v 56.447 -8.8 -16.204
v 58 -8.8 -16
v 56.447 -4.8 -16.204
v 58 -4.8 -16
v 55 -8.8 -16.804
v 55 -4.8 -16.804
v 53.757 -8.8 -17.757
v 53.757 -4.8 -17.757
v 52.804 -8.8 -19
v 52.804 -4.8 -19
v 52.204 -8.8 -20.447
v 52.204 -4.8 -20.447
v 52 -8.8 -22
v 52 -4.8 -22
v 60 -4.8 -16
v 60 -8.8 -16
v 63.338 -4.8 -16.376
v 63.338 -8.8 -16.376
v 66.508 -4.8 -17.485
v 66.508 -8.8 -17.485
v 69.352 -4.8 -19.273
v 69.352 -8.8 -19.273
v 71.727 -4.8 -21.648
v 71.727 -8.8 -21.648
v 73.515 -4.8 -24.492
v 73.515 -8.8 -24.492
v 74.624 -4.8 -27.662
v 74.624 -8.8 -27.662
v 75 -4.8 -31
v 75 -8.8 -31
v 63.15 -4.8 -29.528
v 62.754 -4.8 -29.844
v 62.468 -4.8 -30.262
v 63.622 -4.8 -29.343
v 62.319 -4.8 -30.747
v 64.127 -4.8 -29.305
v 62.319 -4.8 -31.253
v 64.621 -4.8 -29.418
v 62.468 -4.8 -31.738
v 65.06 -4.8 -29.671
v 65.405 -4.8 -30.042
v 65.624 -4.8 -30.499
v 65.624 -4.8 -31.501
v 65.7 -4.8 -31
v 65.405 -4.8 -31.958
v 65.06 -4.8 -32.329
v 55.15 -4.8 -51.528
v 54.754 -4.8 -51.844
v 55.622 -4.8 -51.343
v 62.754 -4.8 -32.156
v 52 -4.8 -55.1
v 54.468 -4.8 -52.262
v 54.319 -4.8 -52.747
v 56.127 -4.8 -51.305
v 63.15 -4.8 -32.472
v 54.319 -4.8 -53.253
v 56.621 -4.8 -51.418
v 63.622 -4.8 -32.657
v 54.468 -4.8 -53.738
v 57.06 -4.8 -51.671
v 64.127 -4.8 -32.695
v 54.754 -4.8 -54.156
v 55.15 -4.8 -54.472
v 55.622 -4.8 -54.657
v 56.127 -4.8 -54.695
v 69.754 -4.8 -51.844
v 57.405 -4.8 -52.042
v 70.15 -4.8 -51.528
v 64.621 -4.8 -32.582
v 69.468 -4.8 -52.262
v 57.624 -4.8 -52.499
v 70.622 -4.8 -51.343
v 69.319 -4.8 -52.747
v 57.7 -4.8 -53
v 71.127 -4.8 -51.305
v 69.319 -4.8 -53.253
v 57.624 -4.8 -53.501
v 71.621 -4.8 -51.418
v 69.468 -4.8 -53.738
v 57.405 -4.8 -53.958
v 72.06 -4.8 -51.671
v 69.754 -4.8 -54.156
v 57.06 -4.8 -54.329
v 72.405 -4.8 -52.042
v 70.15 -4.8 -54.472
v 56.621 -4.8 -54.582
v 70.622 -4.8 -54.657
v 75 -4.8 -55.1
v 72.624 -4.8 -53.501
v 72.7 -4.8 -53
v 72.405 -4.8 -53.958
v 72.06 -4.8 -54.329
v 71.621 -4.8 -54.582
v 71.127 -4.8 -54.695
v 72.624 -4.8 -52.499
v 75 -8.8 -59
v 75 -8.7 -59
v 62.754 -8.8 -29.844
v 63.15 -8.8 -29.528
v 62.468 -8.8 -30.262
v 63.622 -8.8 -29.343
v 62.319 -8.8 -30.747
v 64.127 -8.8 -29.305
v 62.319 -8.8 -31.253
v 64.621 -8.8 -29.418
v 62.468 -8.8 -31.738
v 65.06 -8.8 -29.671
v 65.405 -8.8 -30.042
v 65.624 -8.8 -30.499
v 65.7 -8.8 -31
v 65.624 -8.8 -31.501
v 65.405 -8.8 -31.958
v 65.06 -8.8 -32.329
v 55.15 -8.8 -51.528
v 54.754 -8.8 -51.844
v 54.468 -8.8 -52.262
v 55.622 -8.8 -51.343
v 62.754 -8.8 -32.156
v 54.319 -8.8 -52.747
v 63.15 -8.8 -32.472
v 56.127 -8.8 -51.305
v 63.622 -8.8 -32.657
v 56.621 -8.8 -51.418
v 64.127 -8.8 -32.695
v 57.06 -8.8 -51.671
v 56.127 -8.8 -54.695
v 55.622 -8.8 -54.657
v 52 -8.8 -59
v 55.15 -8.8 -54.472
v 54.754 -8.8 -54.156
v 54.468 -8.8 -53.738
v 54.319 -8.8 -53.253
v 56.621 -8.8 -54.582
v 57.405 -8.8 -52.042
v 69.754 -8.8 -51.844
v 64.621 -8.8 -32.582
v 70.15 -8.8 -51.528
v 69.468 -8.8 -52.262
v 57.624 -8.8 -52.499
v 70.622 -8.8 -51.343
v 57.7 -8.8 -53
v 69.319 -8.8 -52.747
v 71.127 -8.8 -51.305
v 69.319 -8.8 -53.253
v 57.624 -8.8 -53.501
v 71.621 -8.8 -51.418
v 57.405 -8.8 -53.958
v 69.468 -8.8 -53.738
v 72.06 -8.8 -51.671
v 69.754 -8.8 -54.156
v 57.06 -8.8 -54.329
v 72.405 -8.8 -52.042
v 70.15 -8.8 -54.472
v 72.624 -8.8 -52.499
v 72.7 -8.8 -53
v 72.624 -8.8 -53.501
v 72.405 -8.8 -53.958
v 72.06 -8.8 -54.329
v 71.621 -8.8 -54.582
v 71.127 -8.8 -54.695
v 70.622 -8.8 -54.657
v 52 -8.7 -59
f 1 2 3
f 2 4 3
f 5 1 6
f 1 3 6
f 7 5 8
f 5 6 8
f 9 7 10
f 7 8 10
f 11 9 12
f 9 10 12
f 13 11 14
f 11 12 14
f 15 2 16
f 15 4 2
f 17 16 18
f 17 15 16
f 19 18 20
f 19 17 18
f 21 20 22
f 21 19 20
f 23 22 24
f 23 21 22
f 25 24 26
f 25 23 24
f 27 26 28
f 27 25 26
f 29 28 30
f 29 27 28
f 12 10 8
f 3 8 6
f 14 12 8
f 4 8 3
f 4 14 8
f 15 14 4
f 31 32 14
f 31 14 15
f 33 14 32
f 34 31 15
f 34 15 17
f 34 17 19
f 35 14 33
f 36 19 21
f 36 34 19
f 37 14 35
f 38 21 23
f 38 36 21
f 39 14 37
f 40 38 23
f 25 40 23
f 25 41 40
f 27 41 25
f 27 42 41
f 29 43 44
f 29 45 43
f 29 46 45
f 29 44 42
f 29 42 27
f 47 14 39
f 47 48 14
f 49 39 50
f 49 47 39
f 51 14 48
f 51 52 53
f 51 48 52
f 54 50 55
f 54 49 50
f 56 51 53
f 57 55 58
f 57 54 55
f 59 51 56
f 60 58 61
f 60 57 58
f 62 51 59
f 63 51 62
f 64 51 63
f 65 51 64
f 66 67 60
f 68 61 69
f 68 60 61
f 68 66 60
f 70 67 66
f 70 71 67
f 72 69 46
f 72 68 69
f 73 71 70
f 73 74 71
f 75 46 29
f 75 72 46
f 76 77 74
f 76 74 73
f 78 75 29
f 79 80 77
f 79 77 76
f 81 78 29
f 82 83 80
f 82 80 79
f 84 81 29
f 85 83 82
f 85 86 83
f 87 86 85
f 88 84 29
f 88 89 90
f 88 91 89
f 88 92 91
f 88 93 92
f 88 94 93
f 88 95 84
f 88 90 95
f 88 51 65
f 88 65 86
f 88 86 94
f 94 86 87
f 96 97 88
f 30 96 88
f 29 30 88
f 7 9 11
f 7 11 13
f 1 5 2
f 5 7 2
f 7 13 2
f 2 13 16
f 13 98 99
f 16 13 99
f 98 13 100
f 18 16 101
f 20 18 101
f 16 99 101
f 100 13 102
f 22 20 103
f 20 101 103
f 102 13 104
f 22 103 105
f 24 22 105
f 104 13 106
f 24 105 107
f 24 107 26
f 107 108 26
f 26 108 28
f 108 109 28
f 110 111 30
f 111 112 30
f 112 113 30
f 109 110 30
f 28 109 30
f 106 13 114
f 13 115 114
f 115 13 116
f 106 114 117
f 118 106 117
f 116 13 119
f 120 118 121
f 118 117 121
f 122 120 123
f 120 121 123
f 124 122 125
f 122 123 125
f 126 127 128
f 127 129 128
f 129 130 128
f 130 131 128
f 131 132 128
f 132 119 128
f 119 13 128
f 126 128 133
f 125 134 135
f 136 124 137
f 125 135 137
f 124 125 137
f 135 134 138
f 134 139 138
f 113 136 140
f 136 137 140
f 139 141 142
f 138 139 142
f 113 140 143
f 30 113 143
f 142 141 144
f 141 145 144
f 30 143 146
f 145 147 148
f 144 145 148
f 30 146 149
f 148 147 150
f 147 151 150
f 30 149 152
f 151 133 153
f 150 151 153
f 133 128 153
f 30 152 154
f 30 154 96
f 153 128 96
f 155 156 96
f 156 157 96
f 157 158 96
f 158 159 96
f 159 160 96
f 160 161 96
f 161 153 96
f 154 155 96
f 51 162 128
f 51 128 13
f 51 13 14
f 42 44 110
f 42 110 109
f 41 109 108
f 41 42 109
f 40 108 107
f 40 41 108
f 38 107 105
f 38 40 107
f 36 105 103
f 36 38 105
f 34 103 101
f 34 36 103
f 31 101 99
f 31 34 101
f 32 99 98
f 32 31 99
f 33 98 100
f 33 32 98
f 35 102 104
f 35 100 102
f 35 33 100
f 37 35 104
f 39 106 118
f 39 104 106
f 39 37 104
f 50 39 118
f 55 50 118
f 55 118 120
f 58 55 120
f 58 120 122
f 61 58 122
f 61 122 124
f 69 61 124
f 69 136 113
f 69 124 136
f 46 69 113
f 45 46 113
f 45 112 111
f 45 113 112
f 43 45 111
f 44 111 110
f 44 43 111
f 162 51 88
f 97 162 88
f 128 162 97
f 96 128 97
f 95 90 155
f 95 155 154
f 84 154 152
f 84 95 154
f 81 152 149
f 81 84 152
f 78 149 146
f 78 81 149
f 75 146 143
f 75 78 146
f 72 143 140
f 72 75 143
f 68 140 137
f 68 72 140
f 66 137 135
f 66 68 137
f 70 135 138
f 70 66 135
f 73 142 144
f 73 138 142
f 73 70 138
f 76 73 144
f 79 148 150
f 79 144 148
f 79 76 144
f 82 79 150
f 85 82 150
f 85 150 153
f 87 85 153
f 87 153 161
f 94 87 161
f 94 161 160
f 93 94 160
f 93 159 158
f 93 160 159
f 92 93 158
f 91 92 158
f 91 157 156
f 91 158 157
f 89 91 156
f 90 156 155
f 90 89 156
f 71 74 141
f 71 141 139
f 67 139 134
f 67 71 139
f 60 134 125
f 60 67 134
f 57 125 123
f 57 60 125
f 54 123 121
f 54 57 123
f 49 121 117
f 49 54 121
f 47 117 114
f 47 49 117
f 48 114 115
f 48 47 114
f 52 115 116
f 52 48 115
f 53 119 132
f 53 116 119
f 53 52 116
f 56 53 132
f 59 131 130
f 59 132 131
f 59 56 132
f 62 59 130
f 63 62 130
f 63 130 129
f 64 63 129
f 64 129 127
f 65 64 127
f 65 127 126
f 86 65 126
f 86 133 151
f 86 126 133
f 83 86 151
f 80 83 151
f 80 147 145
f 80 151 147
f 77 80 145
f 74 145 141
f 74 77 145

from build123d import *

# Parameters (mm, degrees)
CYLINDER223_R          = 1.7
CYLINDER223_DEPTH      = 21
CYLINDER223_ROLL_ANGLE = 90
CYLINDER201_R          = 1.7
CYLINDER201_DEPTH      = 20
CYLINDER201_ROLL_ANGLE = 90
CYLINDER200_R          = 1.7
CYLINDER200_DEPTH      = 20
CYLINDER200_ROLL_ANGLE = 90
BOX001027045147_W      = 23
BOX001027045147_H      = 4
BOX001027045147_DEPTH  = 43
FILLET034_R            = 15
FILLET038_R            = 6
CHAMFER028_SIZE        = 3.9


with BuildPart() as bearing_fit_cylinder003:
    # Cylinder223 → Cylinder223 (new body)
    with BuildSketch(Plane.XY):
        Circle(CYLINDER223_R)
    extrude(amount=CYLINDER223_DEPTH)


with BuildPart() as bearing_fit_cylinder003_1:
    # Cylinder223 roll: moved
    add(bearing_fit_cylinder003.part.rotate(Axis((0, 0, 0), (1, 0, 0)), CYLINDER223_ROLL_ANGLE))


with BuildPart() as bearing_fit_cylinder003_2:
    # Cylinder223 placement: moved
    add(bearing_fit_cylinder003_1.part.moved(Location((64, 5, -31))))


with BuildPart() as cylinder245:
    # Cylinder201 → Cylinder201 (new body)
    with BuildSketch(Plane.XY):
        Circle(CYLINDER201_R)
    extrude(amount=CYLINDER201_DEPTH)


with BuildPart() as cylinder245_1:
    # Cylinder201 roll: moved
    add(cylinder245.part.rotate(Axis((0, 0, 0), (1, 0, 0)), CYLINDER201_ROLL_ANGLE))


with BuildPart() as cylinder245_2:
    # Cylinder201 placement: moved
    add(cylinder245_1.part.moved(Location((71, 8, -54))))


with BuildPart() as fusion112101:
    # Cylinder200 → Cylinder200 (new body)
    with BuildSketch(Plane.XY):
        Circle(CYLINDER200_R)
    extrude(amount=CYLINDER200_DEPTH)


with BuildPart() as fusion112101_1:
    # Cylinder200 roll: moved
    add(fusion112101.part.rotate(Axis((0, 0, 0), (1, 0, 0)), CYLINDER200_ROLL_ANGLE))


with BuildPart() as fusion112101_2:
    # Cylinder200 placement: moved
    add(fusion112101_1.part.moved(Location((56, 8, -54))))

    # Fusion112101: union Cylinder245
    add(cylinder245_2.part)


with BuildPart() as fusion112101_3:
    # Fusion112101 placement: moved
    add(fusion112101_2.part.moved(Location((0, 0, 1))))


with BuildPart() as chamfer028:
    # Box001027045147 → Box001027045147 (new body)
    with BuildSketch(Plane(origin=(52, -8.8, -59), x_dir=(1, 0, 0), z_dir=(0, 0, 1))):
        with Locations((11.5, 2)):
            Rectangle(BOX001027045147_W, BOX001027045147_H)
    extrude(amount=BOX001027045147_DEPTH)

    # Cut177: cut Fusion112101
    add(fusion112101_3.part, mode=Mode.SUBTRACT)

    # Cut201: cut bearing-fit-cylinder003
    add(bearing_fit_cylinder003_2.part, mode=Mode.SUBTRACT)

    # Fillet034
    fillet034_edges = [chamfer028.edges().sort_by_distance(p)[0] for p in [
        (75, -6.8, -16),
    ]]
    fillet(fillet034_edges, radius=FILLET034_R)

    # Fillet038
    fillet038_edges = [chamfer028.edges().sort_by_distance(p)[0] for p in [
        (52, -6.8, -16),
    ]]
    fillet(fillet038_edges, radius=FILLET038_R)

    # Chamfer028
    chamfer028_edges = [chamfer028.edges().sort_by_distance(p)[0] for p in [
        (63.5, -4.8, -59),
    ]]
    chamfer(chamfer028_edges, length=CHAMFER028_SIZE)


solid = chamfer028.part
